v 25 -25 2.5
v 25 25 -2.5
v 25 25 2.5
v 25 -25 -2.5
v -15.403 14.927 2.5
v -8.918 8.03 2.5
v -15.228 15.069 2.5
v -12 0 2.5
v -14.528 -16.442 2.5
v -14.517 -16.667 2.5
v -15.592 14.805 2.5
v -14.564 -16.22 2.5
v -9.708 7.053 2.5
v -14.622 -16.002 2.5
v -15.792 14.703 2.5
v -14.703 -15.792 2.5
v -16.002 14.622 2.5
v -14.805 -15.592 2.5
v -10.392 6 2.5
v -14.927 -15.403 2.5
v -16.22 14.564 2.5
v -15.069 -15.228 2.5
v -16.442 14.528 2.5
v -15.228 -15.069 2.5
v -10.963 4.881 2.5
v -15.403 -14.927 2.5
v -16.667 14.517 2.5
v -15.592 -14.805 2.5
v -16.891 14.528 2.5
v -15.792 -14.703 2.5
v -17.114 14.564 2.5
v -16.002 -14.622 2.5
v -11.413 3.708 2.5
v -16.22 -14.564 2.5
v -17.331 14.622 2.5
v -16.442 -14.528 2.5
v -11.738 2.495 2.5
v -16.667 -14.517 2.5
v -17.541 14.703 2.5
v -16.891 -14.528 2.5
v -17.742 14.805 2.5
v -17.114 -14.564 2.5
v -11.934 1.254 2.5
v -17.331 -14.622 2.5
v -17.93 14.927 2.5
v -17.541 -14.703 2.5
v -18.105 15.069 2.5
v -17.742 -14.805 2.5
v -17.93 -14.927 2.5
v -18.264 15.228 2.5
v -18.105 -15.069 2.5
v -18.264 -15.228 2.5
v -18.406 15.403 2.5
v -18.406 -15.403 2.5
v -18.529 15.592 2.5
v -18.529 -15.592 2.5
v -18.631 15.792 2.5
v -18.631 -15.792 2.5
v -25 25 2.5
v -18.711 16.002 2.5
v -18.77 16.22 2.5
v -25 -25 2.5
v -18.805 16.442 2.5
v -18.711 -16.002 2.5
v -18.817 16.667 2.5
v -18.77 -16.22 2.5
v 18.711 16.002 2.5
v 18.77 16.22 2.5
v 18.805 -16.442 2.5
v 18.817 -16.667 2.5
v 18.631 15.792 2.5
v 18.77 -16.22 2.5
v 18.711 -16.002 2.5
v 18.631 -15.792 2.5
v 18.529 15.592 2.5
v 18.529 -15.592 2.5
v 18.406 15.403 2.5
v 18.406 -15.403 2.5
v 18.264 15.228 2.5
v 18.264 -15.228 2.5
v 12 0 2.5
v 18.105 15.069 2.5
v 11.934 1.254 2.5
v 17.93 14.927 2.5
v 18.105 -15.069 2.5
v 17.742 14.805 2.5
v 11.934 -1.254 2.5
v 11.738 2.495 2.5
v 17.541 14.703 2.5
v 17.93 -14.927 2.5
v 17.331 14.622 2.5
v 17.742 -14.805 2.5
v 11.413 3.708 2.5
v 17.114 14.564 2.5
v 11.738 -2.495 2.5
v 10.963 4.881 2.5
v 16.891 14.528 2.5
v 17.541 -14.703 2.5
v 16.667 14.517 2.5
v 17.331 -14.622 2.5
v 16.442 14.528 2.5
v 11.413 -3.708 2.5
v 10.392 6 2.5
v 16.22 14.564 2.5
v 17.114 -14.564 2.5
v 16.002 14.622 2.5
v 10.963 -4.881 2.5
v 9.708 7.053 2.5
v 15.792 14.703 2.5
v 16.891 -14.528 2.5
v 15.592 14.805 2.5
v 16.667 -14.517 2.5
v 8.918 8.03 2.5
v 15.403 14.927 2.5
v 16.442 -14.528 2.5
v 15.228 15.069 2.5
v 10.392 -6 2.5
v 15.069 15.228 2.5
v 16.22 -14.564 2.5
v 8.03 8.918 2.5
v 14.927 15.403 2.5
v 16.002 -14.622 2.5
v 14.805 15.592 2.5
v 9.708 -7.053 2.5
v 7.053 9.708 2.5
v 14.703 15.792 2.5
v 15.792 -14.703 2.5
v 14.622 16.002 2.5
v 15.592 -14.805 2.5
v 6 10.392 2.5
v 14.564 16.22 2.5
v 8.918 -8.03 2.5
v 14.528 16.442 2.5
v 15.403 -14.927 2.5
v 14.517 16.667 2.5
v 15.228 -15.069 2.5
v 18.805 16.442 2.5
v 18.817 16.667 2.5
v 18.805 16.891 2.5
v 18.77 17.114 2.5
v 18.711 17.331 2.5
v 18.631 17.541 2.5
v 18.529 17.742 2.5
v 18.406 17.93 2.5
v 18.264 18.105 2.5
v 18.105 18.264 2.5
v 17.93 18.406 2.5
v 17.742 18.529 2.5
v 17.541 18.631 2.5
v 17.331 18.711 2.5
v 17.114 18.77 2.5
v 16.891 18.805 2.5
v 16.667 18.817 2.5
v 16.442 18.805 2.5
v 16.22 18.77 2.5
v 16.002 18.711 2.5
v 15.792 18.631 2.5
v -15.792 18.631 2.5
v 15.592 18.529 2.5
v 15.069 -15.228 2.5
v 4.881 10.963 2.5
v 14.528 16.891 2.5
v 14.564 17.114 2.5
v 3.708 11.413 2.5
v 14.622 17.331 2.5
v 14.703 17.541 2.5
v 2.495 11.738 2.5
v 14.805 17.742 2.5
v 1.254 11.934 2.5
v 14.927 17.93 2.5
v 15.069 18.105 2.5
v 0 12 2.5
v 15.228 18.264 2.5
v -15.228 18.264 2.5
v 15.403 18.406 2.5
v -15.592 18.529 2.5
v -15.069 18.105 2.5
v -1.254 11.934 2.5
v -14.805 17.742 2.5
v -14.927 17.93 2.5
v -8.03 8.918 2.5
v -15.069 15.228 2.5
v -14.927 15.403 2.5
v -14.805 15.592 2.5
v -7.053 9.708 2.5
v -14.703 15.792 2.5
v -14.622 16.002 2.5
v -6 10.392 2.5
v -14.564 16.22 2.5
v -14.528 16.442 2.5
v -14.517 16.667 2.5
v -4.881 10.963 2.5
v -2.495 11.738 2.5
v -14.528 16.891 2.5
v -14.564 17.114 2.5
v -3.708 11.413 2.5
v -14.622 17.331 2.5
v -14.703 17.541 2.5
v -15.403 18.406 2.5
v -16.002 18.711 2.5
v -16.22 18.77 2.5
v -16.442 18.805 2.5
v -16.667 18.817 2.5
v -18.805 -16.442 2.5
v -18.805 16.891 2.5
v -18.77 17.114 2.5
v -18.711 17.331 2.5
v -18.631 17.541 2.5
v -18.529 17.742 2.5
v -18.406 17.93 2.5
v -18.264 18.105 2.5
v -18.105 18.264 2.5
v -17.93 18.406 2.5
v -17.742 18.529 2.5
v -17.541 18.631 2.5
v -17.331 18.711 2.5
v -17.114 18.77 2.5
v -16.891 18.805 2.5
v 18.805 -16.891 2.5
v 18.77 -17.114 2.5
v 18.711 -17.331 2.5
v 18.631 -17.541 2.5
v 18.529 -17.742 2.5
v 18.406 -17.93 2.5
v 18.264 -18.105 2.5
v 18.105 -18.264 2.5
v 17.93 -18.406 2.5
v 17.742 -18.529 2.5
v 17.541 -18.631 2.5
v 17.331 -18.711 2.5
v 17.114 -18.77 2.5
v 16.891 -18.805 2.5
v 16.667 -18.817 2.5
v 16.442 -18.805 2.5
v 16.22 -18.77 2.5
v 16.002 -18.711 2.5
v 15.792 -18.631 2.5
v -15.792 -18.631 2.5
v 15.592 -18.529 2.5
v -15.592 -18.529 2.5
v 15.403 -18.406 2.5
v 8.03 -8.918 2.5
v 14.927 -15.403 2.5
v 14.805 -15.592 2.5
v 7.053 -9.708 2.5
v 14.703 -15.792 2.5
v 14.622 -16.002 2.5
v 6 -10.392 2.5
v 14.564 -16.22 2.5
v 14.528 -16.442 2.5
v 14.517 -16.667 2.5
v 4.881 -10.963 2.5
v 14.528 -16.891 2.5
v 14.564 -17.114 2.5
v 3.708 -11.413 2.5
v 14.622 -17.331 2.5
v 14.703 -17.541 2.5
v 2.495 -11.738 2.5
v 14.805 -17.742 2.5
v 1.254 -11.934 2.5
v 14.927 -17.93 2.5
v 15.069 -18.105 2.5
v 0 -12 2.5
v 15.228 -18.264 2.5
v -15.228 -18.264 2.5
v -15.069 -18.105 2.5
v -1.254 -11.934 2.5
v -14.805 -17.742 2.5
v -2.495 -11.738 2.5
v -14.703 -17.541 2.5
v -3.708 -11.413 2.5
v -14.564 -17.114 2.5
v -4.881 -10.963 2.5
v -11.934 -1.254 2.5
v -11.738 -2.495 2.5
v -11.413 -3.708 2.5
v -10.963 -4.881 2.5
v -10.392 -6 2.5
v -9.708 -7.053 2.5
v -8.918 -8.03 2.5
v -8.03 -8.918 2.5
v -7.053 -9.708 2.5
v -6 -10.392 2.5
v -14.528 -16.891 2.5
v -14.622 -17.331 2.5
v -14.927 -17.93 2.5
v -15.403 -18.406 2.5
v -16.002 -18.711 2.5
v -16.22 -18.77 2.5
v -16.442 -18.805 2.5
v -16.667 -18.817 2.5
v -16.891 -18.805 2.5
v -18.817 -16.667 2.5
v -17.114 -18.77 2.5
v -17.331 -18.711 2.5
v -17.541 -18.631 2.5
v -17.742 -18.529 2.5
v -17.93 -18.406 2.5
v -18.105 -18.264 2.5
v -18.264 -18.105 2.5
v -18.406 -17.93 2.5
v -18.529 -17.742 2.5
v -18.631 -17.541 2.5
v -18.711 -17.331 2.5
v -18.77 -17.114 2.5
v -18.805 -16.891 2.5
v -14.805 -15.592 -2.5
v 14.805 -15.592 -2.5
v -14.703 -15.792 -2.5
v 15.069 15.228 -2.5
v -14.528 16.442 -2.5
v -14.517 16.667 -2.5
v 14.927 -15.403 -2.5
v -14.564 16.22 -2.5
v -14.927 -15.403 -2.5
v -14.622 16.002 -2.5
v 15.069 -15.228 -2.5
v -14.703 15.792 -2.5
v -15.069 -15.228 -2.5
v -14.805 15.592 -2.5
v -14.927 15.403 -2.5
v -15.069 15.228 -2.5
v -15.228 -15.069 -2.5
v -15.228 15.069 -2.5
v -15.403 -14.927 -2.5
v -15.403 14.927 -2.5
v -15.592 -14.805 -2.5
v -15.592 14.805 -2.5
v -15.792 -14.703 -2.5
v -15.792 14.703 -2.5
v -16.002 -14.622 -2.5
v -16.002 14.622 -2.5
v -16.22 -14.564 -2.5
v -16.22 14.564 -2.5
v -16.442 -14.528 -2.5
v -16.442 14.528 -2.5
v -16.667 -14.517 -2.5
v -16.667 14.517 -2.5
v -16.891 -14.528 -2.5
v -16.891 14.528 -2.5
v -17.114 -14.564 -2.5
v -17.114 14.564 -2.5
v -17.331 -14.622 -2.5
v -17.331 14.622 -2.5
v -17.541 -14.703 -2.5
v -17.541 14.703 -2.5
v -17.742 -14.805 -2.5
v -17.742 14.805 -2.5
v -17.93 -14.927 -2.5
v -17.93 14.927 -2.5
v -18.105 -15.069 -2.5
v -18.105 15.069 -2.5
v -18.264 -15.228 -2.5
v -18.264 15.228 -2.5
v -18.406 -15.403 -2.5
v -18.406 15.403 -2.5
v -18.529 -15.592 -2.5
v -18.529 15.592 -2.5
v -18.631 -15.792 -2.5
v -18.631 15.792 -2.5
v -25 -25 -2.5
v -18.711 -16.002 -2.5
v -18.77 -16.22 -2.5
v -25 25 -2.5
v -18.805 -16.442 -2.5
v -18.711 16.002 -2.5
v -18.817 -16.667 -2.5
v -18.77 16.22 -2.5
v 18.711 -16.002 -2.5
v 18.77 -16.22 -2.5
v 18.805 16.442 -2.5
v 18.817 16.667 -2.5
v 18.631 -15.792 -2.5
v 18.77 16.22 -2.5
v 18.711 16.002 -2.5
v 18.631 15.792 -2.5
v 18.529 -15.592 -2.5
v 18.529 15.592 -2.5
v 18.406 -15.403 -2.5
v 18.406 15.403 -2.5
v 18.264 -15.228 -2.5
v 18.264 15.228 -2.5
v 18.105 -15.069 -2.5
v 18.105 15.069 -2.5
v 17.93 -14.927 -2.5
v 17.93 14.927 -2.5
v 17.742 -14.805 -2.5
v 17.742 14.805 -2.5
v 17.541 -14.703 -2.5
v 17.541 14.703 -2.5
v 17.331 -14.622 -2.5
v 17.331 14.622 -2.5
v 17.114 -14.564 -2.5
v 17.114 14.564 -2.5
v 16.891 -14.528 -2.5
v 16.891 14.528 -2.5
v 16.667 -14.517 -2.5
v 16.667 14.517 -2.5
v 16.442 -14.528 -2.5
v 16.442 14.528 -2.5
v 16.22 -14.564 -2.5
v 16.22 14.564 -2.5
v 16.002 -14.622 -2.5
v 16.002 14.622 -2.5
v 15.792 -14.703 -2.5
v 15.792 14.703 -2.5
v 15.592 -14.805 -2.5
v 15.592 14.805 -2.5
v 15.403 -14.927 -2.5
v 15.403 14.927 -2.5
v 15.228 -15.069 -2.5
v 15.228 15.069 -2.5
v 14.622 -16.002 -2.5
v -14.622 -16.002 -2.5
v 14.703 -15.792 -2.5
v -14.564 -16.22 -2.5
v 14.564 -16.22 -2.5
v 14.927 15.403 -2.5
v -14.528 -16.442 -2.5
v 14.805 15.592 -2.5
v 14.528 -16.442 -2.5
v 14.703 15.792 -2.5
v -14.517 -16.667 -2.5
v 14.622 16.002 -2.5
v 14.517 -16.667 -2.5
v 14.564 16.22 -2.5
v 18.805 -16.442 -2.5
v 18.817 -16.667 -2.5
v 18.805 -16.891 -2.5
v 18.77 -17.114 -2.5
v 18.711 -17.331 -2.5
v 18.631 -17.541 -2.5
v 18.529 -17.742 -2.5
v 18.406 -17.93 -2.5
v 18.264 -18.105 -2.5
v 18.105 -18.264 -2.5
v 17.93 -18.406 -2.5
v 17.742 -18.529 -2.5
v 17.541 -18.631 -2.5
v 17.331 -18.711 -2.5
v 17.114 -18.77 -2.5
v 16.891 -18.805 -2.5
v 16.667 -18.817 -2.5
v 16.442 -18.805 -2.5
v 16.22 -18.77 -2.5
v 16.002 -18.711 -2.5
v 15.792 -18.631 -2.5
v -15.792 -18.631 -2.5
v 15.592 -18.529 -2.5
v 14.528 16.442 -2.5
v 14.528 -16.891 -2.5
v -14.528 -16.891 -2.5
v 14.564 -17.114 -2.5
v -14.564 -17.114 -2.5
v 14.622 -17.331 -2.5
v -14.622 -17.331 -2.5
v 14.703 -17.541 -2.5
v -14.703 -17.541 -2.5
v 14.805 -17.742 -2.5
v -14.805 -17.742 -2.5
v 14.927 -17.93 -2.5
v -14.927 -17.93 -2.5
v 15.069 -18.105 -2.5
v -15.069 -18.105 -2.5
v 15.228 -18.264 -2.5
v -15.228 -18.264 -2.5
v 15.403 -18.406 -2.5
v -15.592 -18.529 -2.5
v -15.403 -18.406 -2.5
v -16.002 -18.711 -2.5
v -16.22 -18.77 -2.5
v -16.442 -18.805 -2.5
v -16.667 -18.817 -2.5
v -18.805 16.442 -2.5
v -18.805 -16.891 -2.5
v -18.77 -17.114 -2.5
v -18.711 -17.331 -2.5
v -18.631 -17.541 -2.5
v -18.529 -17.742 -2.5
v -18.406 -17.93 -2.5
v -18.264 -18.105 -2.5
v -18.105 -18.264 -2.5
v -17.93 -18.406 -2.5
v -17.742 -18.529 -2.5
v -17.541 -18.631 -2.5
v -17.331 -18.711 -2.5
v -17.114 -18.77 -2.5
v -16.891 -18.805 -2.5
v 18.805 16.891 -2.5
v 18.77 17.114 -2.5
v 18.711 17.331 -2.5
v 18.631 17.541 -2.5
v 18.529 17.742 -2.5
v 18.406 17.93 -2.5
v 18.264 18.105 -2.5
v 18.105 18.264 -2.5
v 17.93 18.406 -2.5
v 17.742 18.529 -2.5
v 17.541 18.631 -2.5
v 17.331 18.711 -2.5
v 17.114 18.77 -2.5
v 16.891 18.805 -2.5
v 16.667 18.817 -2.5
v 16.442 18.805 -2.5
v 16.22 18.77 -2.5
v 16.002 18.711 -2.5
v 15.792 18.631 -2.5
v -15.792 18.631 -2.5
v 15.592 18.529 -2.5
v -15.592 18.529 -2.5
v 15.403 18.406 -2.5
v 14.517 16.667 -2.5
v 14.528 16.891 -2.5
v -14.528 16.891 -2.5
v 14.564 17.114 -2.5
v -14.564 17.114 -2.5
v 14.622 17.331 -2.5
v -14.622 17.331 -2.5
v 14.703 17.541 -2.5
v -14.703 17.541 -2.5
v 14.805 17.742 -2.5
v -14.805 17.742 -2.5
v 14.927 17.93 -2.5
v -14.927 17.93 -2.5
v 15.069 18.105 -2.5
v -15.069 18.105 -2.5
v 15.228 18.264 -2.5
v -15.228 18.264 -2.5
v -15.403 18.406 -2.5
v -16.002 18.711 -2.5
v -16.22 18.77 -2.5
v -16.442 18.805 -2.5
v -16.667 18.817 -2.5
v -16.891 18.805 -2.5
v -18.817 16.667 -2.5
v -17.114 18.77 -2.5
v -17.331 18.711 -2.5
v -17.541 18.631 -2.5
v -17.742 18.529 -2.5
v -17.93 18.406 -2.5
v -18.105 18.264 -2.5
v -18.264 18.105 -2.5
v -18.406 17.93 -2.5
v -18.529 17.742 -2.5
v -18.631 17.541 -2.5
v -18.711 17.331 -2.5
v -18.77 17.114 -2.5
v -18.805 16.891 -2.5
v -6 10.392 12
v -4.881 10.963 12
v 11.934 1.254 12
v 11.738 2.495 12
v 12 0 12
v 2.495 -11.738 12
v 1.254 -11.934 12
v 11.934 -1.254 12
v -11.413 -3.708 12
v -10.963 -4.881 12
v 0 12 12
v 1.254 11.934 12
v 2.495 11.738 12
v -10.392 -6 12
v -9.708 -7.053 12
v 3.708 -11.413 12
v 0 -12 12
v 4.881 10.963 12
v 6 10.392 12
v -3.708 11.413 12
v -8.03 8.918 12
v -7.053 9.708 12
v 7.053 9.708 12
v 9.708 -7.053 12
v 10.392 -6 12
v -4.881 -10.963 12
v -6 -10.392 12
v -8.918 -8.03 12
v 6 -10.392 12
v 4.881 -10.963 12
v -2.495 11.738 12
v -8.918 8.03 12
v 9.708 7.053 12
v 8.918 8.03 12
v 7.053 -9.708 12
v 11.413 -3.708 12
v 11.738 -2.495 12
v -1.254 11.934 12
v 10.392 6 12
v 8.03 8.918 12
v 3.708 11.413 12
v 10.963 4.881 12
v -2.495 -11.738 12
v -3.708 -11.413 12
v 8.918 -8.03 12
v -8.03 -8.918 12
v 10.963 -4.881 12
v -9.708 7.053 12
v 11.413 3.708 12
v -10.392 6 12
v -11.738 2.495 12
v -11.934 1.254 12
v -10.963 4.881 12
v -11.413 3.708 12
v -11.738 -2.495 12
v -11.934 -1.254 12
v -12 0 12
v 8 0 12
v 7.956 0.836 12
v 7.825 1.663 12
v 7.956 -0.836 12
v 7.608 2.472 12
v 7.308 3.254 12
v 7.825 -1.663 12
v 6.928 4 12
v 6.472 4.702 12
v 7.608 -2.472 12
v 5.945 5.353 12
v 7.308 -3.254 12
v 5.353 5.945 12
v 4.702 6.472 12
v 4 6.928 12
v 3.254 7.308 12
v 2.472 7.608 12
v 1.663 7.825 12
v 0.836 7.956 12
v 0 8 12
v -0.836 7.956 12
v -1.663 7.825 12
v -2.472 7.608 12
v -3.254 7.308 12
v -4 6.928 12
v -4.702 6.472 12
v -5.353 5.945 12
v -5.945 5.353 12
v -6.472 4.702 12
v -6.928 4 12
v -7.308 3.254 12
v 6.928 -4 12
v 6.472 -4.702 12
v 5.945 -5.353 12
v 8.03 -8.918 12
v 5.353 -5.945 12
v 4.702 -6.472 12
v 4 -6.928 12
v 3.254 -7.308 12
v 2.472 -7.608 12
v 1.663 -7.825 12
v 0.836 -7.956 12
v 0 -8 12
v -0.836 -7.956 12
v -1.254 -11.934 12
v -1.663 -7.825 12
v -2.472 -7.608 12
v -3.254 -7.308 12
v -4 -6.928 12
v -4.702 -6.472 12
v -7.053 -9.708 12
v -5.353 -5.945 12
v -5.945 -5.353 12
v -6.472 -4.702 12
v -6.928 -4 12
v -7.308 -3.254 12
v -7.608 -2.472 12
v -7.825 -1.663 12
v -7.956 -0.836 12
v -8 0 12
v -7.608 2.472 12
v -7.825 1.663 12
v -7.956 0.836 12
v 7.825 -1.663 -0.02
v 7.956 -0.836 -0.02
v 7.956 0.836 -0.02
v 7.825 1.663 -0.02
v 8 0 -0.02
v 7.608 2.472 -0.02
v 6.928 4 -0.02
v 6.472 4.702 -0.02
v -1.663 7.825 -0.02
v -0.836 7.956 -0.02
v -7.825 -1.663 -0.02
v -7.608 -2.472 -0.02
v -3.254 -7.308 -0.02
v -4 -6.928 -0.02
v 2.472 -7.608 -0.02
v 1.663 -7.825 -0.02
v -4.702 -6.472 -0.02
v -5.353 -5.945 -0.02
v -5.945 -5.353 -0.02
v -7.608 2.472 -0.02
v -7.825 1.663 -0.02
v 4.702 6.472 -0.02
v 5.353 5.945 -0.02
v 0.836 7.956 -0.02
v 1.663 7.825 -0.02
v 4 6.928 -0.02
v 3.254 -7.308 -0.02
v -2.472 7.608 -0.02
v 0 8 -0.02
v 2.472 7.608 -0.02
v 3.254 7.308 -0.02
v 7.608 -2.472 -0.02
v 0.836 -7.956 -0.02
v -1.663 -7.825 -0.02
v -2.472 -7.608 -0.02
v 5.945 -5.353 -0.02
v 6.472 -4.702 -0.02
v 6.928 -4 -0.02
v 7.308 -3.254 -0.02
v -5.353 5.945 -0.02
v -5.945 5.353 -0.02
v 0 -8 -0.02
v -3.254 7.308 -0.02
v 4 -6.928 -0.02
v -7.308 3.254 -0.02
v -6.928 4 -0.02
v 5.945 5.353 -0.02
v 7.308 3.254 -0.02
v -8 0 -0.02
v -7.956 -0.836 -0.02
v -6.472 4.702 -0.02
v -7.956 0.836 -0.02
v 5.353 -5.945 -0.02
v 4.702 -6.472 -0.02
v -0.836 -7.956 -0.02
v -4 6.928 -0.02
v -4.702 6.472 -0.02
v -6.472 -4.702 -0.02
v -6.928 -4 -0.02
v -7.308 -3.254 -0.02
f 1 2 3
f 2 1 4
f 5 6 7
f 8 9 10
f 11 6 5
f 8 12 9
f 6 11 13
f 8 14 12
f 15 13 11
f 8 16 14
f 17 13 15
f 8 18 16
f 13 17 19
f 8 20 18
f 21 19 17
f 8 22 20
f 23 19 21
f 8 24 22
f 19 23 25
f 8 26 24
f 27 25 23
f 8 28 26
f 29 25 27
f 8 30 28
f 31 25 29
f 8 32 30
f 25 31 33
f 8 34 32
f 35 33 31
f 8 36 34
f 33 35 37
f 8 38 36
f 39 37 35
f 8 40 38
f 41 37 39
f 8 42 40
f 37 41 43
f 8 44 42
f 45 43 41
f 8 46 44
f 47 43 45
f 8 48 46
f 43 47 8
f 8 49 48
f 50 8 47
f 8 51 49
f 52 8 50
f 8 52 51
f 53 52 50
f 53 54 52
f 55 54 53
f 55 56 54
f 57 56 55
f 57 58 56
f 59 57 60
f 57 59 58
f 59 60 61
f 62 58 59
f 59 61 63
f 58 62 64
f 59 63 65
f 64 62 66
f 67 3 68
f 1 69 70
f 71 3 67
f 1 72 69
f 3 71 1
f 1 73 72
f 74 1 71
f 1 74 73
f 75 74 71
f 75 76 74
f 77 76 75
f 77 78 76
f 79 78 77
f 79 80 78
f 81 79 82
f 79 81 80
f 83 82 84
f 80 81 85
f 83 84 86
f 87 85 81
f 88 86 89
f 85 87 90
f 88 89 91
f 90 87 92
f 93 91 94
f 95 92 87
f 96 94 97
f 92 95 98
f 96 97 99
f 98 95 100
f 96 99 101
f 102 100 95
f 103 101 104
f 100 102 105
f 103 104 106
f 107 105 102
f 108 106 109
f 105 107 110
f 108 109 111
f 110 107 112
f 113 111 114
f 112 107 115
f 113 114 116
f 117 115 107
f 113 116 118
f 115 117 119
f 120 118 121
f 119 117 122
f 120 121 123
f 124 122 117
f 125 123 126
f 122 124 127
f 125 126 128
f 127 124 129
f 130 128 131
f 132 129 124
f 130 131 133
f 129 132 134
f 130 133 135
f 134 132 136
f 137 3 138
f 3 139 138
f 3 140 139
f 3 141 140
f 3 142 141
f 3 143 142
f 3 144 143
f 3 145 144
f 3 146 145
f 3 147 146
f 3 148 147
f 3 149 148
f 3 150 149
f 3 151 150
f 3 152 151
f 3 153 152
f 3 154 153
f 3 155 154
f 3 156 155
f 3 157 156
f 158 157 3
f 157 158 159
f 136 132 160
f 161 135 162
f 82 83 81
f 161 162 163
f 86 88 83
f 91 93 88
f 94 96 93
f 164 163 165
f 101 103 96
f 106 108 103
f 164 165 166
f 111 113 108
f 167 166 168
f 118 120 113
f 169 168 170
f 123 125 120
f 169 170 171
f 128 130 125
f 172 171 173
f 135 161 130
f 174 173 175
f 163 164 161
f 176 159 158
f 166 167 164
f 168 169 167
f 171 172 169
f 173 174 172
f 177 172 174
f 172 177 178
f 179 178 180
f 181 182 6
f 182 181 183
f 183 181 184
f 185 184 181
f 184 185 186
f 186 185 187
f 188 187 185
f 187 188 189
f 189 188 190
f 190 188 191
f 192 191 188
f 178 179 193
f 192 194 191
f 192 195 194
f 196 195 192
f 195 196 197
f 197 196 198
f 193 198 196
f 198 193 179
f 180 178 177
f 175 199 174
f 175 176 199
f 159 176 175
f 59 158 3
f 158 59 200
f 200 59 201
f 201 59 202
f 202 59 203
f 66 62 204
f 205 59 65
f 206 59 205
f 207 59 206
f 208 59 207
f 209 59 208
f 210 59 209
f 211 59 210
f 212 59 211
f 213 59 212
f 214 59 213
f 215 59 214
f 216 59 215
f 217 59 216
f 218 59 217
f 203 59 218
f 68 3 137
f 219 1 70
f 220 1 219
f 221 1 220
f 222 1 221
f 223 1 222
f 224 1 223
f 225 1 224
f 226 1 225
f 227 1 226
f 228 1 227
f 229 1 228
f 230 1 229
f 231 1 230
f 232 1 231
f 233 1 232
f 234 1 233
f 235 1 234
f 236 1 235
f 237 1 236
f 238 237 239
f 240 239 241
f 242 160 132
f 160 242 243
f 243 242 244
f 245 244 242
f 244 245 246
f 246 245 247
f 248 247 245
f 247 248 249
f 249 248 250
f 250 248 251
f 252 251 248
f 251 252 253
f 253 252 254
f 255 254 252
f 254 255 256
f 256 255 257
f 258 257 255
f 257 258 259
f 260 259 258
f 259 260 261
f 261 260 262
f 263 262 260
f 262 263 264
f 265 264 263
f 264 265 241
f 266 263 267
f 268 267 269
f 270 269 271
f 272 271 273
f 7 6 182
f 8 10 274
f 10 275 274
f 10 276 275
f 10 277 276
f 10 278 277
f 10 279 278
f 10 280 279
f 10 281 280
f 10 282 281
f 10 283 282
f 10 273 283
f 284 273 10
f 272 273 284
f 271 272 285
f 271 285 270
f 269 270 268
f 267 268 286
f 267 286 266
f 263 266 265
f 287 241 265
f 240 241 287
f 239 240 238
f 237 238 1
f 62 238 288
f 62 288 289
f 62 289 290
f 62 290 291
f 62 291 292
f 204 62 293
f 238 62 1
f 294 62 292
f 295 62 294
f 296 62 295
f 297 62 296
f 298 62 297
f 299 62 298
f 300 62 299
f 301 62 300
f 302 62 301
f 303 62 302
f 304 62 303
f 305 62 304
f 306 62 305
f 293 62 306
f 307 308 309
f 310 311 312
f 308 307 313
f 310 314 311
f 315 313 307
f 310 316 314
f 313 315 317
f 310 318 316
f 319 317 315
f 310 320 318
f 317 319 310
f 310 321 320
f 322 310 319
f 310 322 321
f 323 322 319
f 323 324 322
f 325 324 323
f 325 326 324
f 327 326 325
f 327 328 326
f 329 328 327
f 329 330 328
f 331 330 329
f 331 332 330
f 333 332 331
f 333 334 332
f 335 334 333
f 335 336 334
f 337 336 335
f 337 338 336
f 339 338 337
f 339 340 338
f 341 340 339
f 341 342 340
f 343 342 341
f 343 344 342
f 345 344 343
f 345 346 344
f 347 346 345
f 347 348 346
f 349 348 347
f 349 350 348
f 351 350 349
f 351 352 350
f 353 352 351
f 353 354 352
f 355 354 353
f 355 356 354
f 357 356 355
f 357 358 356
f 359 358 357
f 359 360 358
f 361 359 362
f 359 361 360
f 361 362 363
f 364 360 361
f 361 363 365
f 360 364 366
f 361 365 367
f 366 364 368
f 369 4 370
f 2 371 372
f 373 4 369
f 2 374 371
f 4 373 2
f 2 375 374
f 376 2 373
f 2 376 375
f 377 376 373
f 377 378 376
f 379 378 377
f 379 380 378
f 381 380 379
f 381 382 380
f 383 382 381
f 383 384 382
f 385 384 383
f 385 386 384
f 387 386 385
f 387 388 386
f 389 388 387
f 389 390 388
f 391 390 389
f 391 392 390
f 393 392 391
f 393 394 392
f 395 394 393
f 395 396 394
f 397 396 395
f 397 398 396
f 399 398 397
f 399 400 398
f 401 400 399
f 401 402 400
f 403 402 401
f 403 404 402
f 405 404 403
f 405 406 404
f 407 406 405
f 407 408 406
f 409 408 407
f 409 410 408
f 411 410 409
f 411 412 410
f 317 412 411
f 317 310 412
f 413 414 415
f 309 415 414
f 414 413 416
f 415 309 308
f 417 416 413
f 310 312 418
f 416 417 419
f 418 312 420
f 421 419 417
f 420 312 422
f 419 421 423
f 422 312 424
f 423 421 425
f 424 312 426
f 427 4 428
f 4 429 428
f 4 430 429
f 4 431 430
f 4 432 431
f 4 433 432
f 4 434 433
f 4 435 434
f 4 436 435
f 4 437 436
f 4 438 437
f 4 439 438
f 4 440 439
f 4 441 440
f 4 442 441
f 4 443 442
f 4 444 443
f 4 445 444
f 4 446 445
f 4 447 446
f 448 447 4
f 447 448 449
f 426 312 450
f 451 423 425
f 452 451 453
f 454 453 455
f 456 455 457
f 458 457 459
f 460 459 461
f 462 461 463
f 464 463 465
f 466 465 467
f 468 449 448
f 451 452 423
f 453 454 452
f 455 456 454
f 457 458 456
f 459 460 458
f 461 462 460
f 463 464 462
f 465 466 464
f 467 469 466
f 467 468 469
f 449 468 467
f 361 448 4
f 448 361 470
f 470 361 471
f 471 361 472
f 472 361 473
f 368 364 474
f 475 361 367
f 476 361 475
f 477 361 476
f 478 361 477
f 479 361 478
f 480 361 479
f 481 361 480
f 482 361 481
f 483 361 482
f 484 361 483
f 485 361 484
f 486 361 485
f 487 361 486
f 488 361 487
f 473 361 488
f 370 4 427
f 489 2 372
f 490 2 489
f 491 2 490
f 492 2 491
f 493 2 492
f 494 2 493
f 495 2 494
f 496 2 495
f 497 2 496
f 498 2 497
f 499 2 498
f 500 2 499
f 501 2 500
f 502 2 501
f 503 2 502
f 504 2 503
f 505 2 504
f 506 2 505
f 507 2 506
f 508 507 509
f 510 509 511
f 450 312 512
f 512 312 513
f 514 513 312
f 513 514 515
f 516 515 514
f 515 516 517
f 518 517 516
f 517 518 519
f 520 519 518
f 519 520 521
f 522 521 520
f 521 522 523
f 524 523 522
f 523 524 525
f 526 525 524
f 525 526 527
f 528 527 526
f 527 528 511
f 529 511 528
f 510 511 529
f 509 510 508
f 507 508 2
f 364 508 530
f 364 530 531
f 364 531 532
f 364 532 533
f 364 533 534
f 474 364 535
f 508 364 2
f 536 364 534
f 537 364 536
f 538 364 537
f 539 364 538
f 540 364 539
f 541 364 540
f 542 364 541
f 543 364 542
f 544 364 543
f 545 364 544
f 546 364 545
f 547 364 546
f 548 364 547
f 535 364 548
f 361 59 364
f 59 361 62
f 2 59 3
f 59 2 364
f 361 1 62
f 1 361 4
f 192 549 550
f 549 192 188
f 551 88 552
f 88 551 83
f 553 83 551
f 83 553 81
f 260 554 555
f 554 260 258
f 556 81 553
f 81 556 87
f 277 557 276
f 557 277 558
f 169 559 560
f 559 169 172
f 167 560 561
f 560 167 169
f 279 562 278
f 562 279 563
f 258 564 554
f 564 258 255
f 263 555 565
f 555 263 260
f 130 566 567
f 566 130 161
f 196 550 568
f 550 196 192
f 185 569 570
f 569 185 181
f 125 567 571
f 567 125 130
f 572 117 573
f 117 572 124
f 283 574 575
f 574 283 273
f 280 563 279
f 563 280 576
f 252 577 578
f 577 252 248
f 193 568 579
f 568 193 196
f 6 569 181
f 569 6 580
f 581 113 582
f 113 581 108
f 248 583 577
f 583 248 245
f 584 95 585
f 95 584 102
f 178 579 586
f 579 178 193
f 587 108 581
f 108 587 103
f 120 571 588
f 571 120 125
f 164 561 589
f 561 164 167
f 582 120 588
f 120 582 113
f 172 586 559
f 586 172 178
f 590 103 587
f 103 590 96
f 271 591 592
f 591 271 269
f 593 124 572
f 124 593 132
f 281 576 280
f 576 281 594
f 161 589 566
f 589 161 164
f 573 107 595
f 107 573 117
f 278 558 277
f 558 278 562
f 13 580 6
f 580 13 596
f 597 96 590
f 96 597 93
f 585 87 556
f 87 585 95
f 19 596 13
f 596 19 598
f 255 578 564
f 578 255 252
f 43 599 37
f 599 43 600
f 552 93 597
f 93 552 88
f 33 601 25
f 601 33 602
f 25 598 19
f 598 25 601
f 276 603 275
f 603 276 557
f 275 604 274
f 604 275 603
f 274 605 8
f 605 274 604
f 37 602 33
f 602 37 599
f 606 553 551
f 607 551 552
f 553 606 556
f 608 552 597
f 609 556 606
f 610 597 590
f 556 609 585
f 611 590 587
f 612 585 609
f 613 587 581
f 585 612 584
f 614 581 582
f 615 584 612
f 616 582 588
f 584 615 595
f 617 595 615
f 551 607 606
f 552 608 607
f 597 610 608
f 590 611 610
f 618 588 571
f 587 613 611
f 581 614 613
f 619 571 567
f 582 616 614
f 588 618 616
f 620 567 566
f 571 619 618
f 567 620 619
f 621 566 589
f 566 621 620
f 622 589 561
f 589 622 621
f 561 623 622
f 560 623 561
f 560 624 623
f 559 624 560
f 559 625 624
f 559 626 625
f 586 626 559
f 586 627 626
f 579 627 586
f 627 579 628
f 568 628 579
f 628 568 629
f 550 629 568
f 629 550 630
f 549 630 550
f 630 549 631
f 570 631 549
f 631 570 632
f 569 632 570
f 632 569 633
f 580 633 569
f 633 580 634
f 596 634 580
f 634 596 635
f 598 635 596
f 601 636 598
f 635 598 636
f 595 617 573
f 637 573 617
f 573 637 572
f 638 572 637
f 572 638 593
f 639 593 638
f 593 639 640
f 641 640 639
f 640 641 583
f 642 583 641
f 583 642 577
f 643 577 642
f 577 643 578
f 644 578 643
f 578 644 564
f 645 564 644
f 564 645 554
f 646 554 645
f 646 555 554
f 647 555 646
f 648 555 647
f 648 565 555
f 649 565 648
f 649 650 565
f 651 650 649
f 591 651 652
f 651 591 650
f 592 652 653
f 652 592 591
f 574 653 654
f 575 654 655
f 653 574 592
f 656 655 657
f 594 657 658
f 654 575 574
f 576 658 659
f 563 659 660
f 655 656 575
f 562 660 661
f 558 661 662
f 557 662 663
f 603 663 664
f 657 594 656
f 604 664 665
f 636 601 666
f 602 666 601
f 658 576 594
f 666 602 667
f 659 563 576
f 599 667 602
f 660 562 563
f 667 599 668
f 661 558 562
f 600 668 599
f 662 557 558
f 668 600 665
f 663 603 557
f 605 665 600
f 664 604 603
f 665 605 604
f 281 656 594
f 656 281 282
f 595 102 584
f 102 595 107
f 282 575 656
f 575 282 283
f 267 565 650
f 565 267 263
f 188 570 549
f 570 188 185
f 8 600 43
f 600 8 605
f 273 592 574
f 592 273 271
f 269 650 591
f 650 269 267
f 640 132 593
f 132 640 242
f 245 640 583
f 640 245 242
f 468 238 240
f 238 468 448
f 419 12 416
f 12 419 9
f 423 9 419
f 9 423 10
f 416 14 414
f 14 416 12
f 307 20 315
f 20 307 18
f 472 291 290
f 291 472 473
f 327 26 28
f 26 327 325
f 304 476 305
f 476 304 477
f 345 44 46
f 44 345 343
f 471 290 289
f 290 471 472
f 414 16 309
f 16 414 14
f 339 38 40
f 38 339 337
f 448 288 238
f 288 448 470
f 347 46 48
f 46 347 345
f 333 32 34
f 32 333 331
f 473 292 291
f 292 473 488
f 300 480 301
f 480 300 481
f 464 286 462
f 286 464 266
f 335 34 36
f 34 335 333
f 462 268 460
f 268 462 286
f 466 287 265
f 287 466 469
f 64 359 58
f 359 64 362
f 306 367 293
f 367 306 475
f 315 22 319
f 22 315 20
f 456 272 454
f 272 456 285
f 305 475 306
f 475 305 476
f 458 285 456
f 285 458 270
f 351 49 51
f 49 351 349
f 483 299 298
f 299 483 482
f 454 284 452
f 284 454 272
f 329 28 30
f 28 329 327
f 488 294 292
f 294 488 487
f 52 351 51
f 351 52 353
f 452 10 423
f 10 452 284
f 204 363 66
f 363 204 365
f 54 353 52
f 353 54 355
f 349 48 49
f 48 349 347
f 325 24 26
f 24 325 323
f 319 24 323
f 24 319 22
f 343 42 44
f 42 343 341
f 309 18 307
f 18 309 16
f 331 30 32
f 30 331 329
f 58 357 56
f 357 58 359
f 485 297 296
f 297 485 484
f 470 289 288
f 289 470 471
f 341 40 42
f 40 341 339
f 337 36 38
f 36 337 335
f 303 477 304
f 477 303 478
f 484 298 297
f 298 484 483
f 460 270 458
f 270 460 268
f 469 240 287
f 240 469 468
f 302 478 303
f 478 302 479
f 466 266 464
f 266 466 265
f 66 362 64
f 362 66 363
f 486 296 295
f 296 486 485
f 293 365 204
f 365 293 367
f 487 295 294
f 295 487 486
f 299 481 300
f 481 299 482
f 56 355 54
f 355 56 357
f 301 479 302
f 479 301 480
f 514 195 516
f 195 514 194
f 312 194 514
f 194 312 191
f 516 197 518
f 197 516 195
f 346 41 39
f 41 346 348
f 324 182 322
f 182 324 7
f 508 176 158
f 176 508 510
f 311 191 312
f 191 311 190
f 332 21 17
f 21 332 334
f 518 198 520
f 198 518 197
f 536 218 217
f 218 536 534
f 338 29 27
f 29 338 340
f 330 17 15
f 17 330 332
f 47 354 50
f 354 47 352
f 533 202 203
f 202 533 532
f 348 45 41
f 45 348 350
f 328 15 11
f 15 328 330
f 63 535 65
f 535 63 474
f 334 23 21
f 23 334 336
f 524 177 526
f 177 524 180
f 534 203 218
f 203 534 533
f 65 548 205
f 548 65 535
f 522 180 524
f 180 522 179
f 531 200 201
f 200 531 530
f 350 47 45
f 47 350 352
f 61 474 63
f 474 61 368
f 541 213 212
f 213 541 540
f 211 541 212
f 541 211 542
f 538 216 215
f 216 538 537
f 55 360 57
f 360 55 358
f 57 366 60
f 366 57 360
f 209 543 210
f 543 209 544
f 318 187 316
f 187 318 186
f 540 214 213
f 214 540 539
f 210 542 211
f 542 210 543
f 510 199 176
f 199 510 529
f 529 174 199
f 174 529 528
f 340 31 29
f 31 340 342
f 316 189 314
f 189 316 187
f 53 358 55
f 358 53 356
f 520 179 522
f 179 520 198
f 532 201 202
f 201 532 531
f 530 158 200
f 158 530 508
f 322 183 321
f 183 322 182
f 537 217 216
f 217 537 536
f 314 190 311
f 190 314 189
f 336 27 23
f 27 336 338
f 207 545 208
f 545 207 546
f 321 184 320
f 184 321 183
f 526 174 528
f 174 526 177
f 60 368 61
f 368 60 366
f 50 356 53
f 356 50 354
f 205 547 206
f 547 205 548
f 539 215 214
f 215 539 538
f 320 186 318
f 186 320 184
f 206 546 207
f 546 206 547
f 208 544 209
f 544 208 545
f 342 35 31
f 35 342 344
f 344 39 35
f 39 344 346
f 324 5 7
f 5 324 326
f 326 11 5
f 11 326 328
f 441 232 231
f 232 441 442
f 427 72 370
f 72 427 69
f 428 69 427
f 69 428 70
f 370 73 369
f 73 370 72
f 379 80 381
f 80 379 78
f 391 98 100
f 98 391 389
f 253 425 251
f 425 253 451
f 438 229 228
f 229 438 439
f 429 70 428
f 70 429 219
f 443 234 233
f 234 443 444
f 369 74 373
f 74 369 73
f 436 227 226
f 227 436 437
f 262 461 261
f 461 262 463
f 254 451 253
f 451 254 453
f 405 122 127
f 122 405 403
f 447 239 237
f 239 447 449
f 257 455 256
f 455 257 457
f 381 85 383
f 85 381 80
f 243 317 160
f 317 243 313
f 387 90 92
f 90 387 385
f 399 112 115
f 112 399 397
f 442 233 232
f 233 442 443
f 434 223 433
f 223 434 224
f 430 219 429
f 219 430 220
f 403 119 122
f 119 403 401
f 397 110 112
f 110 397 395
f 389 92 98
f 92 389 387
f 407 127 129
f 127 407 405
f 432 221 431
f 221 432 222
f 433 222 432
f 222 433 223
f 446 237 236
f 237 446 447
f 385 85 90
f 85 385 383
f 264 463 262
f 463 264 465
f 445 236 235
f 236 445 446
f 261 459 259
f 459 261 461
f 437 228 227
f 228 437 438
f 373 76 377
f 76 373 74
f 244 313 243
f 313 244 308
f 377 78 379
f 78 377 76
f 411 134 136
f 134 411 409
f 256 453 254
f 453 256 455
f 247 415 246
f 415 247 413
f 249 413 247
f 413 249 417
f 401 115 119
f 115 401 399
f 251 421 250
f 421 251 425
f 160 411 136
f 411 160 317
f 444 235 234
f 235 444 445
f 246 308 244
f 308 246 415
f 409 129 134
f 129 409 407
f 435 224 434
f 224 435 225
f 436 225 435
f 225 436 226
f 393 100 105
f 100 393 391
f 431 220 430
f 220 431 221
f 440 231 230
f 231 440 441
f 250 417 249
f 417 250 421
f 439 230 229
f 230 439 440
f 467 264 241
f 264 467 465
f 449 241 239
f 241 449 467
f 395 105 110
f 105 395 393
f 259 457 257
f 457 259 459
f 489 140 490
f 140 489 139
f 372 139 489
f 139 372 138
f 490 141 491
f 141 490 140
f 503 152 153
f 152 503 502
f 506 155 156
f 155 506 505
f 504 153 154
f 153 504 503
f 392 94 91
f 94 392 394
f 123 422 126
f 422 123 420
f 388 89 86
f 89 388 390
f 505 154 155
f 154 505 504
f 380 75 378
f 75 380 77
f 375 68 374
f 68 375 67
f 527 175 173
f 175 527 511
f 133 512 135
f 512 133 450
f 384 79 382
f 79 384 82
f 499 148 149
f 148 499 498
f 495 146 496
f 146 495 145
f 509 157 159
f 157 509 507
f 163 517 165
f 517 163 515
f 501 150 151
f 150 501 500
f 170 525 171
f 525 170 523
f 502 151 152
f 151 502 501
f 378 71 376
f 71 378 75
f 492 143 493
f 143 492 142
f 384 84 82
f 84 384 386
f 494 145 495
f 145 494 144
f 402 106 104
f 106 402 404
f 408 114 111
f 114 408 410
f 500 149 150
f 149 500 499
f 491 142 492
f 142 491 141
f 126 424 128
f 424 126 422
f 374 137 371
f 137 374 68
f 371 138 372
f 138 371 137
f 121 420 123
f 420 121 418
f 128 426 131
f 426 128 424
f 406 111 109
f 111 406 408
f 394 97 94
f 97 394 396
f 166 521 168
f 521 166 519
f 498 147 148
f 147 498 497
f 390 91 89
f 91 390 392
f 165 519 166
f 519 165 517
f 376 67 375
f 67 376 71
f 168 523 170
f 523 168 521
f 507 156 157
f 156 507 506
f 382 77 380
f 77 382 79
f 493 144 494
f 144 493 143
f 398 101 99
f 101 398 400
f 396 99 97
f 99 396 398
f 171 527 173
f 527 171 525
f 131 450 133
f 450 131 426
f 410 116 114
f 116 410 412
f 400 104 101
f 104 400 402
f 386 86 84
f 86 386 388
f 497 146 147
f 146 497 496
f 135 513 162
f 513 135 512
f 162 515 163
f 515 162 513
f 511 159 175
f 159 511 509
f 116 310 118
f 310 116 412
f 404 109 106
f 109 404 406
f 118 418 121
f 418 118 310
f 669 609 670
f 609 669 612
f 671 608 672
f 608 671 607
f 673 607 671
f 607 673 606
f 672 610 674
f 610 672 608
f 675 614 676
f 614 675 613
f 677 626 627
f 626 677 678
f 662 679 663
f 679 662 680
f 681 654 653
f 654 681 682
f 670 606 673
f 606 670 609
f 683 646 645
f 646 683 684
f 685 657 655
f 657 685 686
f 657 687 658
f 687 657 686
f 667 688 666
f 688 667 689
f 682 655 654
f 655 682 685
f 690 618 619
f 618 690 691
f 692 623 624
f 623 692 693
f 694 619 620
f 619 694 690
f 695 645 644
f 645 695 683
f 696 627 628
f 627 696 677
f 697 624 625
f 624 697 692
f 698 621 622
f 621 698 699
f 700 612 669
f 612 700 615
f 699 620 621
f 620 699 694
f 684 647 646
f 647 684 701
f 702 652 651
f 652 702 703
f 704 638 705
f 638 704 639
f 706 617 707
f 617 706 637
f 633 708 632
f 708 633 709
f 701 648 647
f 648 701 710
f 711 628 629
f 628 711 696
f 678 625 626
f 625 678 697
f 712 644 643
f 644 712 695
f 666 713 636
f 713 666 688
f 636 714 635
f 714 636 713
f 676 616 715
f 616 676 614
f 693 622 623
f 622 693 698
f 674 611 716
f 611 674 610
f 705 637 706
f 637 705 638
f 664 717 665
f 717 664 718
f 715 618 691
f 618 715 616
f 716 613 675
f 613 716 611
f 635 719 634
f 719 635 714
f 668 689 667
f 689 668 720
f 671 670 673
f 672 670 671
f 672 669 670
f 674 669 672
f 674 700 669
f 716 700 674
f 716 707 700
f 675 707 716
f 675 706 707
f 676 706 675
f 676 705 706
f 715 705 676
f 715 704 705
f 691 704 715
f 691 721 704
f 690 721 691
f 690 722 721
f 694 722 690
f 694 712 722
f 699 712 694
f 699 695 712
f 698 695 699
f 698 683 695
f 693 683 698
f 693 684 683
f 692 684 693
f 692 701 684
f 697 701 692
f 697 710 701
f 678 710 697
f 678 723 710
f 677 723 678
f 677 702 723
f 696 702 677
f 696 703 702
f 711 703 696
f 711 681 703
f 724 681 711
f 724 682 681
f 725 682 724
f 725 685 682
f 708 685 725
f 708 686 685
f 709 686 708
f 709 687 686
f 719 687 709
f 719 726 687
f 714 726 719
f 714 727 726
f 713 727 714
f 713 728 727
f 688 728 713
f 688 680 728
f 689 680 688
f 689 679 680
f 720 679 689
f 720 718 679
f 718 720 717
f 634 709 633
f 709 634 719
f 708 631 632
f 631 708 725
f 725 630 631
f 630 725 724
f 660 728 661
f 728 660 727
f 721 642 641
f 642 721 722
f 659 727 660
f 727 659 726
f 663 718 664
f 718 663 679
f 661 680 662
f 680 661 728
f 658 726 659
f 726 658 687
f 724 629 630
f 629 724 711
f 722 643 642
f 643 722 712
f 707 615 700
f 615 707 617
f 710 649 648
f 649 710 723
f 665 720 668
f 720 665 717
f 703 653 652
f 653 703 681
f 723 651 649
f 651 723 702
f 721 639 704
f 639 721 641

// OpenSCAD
// Flange bearing block for 16 mm bearing OD.
$fn = 60;
eps = 0.02;
bearing_d = 16;
plate_l = bearing_d + 34;
plate_t = 5;
hub_h = bearing_d / 2 + 4;
difference() {
    union() {
        cube([plate_l, plate_l, plate_t], center = true);
        cylinder(d = bearing_d + 8, h = hub_h);
    }
    translate([0, 0, -eps]) cylinder(d = bearing_d, h = hub_h + 2 * eps);
    for (x = [-plate_l / 3, plate_l / 3], y = [-plate_l / 3, plate_l / 3])
        translate([x, y, -plate_t / 2 - eps]) cylinder(d = 4.3, h = plate_t + 2 * eps);
}
